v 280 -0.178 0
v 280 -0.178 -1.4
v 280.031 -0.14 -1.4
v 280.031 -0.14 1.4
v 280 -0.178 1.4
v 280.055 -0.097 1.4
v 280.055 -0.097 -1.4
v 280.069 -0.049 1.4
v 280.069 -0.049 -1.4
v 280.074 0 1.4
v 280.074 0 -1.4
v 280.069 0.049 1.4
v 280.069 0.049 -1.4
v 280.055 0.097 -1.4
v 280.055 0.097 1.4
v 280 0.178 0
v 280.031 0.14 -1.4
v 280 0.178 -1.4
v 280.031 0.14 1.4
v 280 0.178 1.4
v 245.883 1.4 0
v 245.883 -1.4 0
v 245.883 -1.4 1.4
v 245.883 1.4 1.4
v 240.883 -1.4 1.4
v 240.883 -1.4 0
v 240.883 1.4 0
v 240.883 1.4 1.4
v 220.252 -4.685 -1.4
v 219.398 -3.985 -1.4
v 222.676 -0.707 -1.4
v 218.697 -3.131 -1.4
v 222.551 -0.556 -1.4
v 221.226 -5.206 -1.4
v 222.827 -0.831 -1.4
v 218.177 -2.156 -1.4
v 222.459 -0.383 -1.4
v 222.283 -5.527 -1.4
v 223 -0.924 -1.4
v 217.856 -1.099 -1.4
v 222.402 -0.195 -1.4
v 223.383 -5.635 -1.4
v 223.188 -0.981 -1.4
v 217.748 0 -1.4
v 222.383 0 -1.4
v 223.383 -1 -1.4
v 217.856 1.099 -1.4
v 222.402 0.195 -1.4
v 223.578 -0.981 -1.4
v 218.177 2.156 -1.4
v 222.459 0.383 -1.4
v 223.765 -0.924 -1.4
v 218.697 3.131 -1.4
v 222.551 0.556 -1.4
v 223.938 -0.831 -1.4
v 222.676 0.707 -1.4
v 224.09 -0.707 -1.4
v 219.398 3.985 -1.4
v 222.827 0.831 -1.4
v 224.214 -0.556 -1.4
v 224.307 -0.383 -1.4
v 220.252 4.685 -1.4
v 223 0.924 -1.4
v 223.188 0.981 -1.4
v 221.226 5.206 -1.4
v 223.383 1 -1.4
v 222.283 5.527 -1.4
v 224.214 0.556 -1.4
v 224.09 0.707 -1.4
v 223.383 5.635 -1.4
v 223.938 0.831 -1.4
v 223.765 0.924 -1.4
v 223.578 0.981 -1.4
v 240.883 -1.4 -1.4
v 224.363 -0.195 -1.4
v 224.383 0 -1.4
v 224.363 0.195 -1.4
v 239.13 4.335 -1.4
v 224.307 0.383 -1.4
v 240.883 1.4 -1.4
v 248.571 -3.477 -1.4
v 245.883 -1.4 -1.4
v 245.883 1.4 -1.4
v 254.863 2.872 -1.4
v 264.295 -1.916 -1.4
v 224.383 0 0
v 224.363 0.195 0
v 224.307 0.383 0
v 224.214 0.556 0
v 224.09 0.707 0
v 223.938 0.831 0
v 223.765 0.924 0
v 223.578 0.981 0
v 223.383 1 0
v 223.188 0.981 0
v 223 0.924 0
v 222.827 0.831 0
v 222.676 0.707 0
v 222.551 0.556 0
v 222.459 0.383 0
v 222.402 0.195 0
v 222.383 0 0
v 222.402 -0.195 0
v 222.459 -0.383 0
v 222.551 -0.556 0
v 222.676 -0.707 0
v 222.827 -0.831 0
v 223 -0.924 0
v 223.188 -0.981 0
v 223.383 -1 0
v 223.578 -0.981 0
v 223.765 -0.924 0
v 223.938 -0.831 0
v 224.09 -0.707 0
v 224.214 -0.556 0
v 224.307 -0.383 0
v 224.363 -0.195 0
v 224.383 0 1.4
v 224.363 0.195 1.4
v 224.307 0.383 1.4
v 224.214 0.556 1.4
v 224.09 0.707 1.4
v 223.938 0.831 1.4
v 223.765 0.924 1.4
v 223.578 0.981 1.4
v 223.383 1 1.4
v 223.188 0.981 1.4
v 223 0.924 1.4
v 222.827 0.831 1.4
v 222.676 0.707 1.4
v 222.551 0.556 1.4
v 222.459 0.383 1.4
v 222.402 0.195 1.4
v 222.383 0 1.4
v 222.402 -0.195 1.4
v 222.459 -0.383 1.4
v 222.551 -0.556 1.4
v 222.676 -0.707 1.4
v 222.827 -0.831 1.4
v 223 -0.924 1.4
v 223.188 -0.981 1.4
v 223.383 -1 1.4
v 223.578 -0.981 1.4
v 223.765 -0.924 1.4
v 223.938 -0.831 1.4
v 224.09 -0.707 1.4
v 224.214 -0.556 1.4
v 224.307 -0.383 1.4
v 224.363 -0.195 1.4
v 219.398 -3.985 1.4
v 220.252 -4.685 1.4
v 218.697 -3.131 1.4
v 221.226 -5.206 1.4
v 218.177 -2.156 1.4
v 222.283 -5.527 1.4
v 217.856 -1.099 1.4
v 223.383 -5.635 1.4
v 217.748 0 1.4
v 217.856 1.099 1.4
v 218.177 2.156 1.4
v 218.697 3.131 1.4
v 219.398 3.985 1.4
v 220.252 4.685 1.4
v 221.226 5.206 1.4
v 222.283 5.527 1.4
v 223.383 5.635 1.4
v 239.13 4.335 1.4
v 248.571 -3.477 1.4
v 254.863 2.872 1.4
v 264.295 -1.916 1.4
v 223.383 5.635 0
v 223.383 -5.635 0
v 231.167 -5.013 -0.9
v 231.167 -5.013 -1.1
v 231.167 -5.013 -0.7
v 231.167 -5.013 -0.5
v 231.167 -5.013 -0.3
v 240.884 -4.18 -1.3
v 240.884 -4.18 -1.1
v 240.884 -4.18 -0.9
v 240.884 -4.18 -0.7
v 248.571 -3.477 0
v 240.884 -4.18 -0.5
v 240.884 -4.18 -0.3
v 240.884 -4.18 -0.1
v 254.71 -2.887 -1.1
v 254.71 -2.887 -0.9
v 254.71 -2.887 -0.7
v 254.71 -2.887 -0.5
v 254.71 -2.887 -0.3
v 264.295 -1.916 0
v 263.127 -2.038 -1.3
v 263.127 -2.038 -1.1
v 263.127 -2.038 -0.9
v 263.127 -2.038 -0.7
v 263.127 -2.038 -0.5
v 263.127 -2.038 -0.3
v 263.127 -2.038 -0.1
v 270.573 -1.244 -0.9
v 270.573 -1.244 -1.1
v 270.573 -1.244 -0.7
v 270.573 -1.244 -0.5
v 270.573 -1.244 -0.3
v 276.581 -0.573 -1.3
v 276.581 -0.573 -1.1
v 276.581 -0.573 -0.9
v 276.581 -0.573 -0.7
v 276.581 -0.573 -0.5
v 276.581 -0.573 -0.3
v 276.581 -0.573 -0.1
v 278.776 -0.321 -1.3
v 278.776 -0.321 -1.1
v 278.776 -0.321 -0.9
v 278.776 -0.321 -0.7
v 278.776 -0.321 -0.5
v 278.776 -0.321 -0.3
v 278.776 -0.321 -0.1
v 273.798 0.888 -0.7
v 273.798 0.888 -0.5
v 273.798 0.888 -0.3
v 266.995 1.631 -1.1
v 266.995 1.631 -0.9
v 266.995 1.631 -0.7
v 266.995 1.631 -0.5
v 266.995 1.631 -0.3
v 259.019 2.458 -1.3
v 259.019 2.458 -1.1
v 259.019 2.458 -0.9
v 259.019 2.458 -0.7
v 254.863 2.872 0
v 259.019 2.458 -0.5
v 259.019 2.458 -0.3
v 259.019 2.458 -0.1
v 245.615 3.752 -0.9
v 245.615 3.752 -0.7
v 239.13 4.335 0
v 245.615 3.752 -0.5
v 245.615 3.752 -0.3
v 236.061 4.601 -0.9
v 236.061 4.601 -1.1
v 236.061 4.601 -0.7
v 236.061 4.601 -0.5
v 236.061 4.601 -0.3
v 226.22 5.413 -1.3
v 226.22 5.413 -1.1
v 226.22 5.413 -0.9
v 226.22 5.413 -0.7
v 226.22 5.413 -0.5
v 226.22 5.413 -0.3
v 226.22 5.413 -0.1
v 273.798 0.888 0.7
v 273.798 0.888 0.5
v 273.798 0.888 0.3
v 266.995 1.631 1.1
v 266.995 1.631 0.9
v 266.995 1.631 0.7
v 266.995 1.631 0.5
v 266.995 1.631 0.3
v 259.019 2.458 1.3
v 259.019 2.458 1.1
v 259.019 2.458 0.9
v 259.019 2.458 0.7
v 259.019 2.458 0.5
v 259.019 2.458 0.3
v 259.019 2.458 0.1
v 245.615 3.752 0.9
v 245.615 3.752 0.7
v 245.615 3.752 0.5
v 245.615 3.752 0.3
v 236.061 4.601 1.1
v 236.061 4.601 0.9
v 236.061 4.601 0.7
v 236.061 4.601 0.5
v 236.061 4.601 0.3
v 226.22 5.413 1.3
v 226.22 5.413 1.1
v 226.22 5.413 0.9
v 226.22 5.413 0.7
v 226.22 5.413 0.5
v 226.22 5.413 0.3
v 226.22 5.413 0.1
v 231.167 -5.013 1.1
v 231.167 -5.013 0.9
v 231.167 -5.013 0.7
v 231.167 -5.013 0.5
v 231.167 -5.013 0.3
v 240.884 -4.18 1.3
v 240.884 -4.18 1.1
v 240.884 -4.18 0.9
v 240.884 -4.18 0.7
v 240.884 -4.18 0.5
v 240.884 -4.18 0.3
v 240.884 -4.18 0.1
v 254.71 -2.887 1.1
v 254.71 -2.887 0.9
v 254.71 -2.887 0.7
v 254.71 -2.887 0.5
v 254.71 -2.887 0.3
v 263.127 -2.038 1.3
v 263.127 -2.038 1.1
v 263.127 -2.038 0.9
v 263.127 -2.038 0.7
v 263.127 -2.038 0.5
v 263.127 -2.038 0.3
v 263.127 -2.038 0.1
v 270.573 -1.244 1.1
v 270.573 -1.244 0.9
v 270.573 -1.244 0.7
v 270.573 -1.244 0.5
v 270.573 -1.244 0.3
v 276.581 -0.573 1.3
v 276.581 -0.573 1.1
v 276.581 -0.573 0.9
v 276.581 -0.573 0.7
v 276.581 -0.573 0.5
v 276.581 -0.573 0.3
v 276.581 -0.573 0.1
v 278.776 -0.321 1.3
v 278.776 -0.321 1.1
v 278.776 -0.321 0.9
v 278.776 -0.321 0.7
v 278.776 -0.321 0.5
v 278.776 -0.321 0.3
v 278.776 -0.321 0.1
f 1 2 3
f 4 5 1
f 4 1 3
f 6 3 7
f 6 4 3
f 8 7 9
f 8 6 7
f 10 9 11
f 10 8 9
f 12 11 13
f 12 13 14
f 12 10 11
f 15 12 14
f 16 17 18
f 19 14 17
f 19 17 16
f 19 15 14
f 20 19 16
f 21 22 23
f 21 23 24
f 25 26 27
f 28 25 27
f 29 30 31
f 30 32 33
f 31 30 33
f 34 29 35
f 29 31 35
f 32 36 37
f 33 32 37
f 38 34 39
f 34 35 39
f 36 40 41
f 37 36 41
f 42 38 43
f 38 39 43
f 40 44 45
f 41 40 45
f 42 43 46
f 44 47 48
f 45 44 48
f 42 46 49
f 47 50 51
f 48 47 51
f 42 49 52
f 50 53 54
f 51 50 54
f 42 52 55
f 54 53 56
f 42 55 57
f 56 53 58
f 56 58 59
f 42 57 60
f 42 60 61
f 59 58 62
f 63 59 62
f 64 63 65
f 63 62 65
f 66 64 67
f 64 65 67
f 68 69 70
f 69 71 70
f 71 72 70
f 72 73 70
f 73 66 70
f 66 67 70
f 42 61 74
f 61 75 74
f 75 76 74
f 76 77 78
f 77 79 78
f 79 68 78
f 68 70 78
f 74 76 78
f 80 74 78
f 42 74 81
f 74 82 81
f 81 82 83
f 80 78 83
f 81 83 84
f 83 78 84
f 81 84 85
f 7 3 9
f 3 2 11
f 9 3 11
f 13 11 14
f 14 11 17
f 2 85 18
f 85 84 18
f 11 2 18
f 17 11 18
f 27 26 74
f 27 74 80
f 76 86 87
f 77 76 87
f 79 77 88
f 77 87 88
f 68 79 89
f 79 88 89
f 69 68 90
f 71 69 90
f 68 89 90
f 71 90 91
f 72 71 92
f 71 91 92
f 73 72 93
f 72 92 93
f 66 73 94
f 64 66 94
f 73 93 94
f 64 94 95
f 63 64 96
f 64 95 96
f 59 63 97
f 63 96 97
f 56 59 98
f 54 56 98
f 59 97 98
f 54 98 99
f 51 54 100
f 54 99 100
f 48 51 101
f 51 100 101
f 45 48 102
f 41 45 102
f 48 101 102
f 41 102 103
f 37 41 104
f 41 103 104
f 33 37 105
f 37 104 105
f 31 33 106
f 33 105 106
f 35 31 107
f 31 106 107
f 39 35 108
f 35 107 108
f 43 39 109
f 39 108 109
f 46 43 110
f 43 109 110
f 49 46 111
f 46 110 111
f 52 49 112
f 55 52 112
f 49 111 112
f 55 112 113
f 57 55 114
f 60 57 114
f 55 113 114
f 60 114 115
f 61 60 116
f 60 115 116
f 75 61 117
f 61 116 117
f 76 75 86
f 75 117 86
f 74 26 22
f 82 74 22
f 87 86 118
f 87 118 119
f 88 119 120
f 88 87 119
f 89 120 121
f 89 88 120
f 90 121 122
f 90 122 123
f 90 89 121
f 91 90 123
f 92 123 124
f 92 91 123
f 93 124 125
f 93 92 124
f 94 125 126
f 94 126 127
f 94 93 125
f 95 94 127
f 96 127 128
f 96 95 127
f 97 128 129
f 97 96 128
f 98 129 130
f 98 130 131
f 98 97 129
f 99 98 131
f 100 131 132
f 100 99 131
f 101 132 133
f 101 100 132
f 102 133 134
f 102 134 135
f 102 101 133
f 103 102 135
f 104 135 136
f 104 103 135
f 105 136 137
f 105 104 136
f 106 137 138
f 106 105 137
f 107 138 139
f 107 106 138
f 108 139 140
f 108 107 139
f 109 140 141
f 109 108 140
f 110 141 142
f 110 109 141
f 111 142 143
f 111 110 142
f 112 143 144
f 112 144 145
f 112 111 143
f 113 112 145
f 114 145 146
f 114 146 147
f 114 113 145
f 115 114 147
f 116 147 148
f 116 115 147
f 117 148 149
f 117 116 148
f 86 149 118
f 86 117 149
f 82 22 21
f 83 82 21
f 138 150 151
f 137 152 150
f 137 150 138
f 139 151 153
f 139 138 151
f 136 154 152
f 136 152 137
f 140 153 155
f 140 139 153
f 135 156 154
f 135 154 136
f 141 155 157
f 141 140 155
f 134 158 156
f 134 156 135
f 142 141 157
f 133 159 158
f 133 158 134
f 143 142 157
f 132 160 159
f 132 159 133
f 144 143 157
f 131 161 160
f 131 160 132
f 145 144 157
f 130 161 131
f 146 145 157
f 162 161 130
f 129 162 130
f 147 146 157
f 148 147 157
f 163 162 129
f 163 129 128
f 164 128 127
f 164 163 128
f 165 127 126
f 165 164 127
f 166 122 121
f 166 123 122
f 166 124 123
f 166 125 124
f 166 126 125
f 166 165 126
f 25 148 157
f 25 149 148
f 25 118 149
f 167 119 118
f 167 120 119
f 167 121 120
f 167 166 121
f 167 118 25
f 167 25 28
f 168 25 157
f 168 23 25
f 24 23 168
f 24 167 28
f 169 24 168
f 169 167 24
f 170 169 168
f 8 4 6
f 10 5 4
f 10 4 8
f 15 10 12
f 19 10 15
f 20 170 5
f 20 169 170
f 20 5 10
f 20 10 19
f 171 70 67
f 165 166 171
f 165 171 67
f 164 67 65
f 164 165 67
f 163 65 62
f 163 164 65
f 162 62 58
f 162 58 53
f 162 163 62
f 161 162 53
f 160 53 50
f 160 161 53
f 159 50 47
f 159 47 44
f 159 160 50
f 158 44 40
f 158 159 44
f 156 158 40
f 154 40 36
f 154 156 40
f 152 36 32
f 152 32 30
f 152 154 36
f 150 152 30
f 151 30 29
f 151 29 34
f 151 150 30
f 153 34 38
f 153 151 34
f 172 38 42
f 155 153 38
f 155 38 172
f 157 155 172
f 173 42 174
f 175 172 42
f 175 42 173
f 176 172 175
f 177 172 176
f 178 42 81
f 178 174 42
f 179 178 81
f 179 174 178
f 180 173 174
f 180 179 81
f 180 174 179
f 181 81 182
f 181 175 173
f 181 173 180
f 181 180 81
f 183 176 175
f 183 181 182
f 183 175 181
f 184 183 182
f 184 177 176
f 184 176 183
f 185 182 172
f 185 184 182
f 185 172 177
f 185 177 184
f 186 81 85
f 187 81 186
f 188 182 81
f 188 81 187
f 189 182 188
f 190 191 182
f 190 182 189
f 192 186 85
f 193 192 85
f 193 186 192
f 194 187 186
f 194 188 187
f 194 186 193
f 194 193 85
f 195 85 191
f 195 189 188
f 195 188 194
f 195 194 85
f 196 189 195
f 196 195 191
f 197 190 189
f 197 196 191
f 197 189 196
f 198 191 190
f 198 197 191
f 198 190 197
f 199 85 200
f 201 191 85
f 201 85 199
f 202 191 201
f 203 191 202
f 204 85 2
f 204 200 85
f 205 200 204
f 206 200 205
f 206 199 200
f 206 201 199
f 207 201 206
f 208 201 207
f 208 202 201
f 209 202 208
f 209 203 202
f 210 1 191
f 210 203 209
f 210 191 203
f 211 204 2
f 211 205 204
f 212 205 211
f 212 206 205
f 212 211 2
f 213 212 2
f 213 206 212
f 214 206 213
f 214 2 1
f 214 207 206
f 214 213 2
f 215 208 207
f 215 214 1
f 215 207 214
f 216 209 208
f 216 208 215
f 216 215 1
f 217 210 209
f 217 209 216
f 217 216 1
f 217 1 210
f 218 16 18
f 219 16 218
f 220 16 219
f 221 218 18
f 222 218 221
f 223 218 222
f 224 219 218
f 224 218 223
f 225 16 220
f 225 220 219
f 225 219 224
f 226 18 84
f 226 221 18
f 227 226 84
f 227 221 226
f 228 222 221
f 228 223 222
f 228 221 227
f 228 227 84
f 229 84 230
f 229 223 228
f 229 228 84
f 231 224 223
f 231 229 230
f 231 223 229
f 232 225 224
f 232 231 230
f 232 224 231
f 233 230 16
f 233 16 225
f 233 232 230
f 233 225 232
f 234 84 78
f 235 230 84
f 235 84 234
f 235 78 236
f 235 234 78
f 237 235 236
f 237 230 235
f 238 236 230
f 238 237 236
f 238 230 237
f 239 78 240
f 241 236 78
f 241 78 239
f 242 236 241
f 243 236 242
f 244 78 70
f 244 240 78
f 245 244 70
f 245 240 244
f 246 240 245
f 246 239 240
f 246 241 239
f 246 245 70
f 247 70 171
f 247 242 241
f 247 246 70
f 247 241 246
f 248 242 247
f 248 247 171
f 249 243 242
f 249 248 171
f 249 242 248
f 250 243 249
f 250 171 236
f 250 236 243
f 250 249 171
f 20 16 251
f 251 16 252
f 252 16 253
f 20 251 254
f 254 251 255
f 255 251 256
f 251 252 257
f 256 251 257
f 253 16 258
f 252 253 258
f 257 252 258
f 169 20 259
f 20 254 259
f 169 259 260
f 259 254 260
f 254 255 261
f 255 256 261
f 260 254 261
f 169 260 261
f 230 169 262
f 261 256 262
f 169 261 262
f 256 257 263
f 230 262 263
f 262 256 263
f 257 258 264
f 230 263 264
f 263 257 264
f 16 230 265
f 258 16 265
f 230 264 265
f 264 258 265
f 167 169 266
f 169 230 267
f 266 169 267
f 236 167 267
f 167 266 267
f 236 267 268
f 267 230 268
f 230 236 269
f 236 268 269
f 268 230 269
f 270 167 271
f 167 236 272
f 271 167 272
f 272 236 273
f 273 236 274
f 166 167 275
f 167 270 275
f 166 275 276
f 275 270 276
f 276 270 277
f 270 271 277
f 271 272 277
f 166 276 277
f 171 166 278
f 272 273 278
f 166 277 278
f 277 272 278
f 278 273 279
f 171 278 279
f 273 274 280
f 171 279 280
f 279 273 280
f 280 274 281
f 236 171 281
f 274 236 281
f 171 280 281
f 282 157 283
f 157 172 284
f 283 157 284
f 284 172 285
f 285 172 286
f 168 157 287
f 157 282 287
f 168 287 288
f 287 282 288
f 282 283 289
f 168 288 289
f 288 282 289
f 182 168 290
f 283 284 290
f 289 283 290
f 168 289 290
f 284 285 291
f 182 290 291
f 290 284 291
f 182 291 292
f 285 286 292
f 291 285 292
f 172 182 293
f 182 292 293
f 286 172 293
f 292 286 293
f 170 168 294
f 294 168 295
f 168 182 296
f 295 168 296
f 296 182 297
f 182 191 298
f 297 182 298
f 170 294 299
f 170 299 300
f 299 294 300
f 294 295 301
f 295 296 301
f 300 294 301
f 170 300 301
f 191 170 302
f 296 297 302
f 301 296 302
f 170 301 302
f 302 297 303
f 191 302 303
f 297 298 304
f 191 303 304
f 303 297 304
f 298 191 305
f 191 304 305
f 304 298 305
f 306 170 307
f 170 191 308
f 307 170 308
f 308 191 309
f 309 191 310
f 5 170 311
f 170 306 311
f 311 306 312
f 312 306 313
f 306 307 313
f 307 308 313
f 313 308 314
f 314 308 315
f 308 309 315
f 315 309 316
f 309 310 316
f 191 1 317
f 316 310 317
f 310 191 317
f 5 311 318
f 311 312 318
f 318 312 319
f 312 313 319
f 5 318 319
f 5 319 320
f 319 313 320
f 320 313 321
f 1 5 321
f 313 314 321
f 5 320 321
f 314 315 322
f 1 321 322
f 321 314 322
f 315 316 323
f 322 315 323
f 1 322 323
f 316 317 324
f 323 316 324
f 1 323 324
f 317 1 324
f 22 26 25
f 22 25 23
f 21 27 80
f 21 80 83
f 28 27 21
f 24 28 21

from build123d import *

# Parameters (mm, degrees)
SKETCH_1_W      = 5
SKETCH_1_H      = 2.8
SKETCH_1_R      = 1
EXTRUDE_1_DEPTH = 1.4


with BuildPart() as part:
    # Эскиз1 → Бобышка-Вытянуть1 (new, symmetric)
    with BuildSketch(Plane.XY):
        with BuildLine():
            ThreePointArc((223.382624747, 5.634990628), (219.398084745, 3.984540168), (217.747634119, 2.35e-07))
            ThreePointArc((217.747634119, 2.35e-07), (219.398084579, -3.984540002), (223.382624747, -5.634990628))
            add(Edge.make_bspline(
                [(223.382624747, -5.634990628), (224.328656864, -5.562010205), (226.923894547, -5.359166556), (231.150377303, -5.017351103), (236.038226964, -4.605811749), (240.854179313, -4.184912649), (247.071089236, -3.62220531), (253.116111921, -3.047869044), (258.952644662, -2.467188138), (263.047743378, -2.047856604), (266.898988862, -1.642607304), (270.455833183, -1.258590905), (273.651166984, -0.905304265), (276.385426802, -0.596436482), (278.45259621, -0.358958361), (279.592043704, -0.226075898), (280, -0.1785)],
                knots=[0.670161589, 0.670161589, 0.670161589, 0.670161589, 0.686667237, 0.715444849, 0.743923546, 0.77199483, 0.799540253, 0.852512115, 0.877624446, 0.901571134, 0.924121062, 0.944988816, 0.963803939, 0.980044339, 0.992855276, 1, 1, 1, 1], degree=3))
            ThreePointArc((280, -0.1785), (280.073937121, 0), (280, 0.1785))
            add(Edge.make_bspline(
                [(280, 0.1785), (279.592043704, 0.226075898), (278.45259621, 0.358958361), (276.385426802, 0.596436482), (273.651166984, 0.905304265), (270.455833183, 1.258590905), (266.898988862, 1.642607304), (263.047743378, 2.047856604), (258.952644662, 2.467188138), (253.116111921, 3.047869044), (247.071089236, 3.62220531), (240.854179313, 4.184912649), (236.038226964, 4.605811749), (231.150377303, 5.017351103), (226.923894547, 5.359166556), (224.328656864, 5.562010205), (223.382624747, 5.634990628)],
                knots=[0, 0, 0, 0, 0.007144724, 0.019955661, 0.036196061, 0.055011184, 0.075878938, 0.098428866, 0.122375554, 0.147487885, 0.200459747, 0.22800517, 0.256076454, 0.284555151, 0.313332763, 0.329838411, 0.329838411, 0.329838411, 0.329838411], degree=3))
        make_face()
        with Locations((243.382624747, 0)):
            Rectangle(SKETCH_1_W, SKETCH_1_H, mode=Mode.SUBTRACT)
        with Locations((223.382624747, 0)):
            Circle(SKETCH_1_R, mode=Mode.SUBTRACT)
    extrude(amount=EXTRUDE_1_DEPTH, both=True)


solid = part.part
